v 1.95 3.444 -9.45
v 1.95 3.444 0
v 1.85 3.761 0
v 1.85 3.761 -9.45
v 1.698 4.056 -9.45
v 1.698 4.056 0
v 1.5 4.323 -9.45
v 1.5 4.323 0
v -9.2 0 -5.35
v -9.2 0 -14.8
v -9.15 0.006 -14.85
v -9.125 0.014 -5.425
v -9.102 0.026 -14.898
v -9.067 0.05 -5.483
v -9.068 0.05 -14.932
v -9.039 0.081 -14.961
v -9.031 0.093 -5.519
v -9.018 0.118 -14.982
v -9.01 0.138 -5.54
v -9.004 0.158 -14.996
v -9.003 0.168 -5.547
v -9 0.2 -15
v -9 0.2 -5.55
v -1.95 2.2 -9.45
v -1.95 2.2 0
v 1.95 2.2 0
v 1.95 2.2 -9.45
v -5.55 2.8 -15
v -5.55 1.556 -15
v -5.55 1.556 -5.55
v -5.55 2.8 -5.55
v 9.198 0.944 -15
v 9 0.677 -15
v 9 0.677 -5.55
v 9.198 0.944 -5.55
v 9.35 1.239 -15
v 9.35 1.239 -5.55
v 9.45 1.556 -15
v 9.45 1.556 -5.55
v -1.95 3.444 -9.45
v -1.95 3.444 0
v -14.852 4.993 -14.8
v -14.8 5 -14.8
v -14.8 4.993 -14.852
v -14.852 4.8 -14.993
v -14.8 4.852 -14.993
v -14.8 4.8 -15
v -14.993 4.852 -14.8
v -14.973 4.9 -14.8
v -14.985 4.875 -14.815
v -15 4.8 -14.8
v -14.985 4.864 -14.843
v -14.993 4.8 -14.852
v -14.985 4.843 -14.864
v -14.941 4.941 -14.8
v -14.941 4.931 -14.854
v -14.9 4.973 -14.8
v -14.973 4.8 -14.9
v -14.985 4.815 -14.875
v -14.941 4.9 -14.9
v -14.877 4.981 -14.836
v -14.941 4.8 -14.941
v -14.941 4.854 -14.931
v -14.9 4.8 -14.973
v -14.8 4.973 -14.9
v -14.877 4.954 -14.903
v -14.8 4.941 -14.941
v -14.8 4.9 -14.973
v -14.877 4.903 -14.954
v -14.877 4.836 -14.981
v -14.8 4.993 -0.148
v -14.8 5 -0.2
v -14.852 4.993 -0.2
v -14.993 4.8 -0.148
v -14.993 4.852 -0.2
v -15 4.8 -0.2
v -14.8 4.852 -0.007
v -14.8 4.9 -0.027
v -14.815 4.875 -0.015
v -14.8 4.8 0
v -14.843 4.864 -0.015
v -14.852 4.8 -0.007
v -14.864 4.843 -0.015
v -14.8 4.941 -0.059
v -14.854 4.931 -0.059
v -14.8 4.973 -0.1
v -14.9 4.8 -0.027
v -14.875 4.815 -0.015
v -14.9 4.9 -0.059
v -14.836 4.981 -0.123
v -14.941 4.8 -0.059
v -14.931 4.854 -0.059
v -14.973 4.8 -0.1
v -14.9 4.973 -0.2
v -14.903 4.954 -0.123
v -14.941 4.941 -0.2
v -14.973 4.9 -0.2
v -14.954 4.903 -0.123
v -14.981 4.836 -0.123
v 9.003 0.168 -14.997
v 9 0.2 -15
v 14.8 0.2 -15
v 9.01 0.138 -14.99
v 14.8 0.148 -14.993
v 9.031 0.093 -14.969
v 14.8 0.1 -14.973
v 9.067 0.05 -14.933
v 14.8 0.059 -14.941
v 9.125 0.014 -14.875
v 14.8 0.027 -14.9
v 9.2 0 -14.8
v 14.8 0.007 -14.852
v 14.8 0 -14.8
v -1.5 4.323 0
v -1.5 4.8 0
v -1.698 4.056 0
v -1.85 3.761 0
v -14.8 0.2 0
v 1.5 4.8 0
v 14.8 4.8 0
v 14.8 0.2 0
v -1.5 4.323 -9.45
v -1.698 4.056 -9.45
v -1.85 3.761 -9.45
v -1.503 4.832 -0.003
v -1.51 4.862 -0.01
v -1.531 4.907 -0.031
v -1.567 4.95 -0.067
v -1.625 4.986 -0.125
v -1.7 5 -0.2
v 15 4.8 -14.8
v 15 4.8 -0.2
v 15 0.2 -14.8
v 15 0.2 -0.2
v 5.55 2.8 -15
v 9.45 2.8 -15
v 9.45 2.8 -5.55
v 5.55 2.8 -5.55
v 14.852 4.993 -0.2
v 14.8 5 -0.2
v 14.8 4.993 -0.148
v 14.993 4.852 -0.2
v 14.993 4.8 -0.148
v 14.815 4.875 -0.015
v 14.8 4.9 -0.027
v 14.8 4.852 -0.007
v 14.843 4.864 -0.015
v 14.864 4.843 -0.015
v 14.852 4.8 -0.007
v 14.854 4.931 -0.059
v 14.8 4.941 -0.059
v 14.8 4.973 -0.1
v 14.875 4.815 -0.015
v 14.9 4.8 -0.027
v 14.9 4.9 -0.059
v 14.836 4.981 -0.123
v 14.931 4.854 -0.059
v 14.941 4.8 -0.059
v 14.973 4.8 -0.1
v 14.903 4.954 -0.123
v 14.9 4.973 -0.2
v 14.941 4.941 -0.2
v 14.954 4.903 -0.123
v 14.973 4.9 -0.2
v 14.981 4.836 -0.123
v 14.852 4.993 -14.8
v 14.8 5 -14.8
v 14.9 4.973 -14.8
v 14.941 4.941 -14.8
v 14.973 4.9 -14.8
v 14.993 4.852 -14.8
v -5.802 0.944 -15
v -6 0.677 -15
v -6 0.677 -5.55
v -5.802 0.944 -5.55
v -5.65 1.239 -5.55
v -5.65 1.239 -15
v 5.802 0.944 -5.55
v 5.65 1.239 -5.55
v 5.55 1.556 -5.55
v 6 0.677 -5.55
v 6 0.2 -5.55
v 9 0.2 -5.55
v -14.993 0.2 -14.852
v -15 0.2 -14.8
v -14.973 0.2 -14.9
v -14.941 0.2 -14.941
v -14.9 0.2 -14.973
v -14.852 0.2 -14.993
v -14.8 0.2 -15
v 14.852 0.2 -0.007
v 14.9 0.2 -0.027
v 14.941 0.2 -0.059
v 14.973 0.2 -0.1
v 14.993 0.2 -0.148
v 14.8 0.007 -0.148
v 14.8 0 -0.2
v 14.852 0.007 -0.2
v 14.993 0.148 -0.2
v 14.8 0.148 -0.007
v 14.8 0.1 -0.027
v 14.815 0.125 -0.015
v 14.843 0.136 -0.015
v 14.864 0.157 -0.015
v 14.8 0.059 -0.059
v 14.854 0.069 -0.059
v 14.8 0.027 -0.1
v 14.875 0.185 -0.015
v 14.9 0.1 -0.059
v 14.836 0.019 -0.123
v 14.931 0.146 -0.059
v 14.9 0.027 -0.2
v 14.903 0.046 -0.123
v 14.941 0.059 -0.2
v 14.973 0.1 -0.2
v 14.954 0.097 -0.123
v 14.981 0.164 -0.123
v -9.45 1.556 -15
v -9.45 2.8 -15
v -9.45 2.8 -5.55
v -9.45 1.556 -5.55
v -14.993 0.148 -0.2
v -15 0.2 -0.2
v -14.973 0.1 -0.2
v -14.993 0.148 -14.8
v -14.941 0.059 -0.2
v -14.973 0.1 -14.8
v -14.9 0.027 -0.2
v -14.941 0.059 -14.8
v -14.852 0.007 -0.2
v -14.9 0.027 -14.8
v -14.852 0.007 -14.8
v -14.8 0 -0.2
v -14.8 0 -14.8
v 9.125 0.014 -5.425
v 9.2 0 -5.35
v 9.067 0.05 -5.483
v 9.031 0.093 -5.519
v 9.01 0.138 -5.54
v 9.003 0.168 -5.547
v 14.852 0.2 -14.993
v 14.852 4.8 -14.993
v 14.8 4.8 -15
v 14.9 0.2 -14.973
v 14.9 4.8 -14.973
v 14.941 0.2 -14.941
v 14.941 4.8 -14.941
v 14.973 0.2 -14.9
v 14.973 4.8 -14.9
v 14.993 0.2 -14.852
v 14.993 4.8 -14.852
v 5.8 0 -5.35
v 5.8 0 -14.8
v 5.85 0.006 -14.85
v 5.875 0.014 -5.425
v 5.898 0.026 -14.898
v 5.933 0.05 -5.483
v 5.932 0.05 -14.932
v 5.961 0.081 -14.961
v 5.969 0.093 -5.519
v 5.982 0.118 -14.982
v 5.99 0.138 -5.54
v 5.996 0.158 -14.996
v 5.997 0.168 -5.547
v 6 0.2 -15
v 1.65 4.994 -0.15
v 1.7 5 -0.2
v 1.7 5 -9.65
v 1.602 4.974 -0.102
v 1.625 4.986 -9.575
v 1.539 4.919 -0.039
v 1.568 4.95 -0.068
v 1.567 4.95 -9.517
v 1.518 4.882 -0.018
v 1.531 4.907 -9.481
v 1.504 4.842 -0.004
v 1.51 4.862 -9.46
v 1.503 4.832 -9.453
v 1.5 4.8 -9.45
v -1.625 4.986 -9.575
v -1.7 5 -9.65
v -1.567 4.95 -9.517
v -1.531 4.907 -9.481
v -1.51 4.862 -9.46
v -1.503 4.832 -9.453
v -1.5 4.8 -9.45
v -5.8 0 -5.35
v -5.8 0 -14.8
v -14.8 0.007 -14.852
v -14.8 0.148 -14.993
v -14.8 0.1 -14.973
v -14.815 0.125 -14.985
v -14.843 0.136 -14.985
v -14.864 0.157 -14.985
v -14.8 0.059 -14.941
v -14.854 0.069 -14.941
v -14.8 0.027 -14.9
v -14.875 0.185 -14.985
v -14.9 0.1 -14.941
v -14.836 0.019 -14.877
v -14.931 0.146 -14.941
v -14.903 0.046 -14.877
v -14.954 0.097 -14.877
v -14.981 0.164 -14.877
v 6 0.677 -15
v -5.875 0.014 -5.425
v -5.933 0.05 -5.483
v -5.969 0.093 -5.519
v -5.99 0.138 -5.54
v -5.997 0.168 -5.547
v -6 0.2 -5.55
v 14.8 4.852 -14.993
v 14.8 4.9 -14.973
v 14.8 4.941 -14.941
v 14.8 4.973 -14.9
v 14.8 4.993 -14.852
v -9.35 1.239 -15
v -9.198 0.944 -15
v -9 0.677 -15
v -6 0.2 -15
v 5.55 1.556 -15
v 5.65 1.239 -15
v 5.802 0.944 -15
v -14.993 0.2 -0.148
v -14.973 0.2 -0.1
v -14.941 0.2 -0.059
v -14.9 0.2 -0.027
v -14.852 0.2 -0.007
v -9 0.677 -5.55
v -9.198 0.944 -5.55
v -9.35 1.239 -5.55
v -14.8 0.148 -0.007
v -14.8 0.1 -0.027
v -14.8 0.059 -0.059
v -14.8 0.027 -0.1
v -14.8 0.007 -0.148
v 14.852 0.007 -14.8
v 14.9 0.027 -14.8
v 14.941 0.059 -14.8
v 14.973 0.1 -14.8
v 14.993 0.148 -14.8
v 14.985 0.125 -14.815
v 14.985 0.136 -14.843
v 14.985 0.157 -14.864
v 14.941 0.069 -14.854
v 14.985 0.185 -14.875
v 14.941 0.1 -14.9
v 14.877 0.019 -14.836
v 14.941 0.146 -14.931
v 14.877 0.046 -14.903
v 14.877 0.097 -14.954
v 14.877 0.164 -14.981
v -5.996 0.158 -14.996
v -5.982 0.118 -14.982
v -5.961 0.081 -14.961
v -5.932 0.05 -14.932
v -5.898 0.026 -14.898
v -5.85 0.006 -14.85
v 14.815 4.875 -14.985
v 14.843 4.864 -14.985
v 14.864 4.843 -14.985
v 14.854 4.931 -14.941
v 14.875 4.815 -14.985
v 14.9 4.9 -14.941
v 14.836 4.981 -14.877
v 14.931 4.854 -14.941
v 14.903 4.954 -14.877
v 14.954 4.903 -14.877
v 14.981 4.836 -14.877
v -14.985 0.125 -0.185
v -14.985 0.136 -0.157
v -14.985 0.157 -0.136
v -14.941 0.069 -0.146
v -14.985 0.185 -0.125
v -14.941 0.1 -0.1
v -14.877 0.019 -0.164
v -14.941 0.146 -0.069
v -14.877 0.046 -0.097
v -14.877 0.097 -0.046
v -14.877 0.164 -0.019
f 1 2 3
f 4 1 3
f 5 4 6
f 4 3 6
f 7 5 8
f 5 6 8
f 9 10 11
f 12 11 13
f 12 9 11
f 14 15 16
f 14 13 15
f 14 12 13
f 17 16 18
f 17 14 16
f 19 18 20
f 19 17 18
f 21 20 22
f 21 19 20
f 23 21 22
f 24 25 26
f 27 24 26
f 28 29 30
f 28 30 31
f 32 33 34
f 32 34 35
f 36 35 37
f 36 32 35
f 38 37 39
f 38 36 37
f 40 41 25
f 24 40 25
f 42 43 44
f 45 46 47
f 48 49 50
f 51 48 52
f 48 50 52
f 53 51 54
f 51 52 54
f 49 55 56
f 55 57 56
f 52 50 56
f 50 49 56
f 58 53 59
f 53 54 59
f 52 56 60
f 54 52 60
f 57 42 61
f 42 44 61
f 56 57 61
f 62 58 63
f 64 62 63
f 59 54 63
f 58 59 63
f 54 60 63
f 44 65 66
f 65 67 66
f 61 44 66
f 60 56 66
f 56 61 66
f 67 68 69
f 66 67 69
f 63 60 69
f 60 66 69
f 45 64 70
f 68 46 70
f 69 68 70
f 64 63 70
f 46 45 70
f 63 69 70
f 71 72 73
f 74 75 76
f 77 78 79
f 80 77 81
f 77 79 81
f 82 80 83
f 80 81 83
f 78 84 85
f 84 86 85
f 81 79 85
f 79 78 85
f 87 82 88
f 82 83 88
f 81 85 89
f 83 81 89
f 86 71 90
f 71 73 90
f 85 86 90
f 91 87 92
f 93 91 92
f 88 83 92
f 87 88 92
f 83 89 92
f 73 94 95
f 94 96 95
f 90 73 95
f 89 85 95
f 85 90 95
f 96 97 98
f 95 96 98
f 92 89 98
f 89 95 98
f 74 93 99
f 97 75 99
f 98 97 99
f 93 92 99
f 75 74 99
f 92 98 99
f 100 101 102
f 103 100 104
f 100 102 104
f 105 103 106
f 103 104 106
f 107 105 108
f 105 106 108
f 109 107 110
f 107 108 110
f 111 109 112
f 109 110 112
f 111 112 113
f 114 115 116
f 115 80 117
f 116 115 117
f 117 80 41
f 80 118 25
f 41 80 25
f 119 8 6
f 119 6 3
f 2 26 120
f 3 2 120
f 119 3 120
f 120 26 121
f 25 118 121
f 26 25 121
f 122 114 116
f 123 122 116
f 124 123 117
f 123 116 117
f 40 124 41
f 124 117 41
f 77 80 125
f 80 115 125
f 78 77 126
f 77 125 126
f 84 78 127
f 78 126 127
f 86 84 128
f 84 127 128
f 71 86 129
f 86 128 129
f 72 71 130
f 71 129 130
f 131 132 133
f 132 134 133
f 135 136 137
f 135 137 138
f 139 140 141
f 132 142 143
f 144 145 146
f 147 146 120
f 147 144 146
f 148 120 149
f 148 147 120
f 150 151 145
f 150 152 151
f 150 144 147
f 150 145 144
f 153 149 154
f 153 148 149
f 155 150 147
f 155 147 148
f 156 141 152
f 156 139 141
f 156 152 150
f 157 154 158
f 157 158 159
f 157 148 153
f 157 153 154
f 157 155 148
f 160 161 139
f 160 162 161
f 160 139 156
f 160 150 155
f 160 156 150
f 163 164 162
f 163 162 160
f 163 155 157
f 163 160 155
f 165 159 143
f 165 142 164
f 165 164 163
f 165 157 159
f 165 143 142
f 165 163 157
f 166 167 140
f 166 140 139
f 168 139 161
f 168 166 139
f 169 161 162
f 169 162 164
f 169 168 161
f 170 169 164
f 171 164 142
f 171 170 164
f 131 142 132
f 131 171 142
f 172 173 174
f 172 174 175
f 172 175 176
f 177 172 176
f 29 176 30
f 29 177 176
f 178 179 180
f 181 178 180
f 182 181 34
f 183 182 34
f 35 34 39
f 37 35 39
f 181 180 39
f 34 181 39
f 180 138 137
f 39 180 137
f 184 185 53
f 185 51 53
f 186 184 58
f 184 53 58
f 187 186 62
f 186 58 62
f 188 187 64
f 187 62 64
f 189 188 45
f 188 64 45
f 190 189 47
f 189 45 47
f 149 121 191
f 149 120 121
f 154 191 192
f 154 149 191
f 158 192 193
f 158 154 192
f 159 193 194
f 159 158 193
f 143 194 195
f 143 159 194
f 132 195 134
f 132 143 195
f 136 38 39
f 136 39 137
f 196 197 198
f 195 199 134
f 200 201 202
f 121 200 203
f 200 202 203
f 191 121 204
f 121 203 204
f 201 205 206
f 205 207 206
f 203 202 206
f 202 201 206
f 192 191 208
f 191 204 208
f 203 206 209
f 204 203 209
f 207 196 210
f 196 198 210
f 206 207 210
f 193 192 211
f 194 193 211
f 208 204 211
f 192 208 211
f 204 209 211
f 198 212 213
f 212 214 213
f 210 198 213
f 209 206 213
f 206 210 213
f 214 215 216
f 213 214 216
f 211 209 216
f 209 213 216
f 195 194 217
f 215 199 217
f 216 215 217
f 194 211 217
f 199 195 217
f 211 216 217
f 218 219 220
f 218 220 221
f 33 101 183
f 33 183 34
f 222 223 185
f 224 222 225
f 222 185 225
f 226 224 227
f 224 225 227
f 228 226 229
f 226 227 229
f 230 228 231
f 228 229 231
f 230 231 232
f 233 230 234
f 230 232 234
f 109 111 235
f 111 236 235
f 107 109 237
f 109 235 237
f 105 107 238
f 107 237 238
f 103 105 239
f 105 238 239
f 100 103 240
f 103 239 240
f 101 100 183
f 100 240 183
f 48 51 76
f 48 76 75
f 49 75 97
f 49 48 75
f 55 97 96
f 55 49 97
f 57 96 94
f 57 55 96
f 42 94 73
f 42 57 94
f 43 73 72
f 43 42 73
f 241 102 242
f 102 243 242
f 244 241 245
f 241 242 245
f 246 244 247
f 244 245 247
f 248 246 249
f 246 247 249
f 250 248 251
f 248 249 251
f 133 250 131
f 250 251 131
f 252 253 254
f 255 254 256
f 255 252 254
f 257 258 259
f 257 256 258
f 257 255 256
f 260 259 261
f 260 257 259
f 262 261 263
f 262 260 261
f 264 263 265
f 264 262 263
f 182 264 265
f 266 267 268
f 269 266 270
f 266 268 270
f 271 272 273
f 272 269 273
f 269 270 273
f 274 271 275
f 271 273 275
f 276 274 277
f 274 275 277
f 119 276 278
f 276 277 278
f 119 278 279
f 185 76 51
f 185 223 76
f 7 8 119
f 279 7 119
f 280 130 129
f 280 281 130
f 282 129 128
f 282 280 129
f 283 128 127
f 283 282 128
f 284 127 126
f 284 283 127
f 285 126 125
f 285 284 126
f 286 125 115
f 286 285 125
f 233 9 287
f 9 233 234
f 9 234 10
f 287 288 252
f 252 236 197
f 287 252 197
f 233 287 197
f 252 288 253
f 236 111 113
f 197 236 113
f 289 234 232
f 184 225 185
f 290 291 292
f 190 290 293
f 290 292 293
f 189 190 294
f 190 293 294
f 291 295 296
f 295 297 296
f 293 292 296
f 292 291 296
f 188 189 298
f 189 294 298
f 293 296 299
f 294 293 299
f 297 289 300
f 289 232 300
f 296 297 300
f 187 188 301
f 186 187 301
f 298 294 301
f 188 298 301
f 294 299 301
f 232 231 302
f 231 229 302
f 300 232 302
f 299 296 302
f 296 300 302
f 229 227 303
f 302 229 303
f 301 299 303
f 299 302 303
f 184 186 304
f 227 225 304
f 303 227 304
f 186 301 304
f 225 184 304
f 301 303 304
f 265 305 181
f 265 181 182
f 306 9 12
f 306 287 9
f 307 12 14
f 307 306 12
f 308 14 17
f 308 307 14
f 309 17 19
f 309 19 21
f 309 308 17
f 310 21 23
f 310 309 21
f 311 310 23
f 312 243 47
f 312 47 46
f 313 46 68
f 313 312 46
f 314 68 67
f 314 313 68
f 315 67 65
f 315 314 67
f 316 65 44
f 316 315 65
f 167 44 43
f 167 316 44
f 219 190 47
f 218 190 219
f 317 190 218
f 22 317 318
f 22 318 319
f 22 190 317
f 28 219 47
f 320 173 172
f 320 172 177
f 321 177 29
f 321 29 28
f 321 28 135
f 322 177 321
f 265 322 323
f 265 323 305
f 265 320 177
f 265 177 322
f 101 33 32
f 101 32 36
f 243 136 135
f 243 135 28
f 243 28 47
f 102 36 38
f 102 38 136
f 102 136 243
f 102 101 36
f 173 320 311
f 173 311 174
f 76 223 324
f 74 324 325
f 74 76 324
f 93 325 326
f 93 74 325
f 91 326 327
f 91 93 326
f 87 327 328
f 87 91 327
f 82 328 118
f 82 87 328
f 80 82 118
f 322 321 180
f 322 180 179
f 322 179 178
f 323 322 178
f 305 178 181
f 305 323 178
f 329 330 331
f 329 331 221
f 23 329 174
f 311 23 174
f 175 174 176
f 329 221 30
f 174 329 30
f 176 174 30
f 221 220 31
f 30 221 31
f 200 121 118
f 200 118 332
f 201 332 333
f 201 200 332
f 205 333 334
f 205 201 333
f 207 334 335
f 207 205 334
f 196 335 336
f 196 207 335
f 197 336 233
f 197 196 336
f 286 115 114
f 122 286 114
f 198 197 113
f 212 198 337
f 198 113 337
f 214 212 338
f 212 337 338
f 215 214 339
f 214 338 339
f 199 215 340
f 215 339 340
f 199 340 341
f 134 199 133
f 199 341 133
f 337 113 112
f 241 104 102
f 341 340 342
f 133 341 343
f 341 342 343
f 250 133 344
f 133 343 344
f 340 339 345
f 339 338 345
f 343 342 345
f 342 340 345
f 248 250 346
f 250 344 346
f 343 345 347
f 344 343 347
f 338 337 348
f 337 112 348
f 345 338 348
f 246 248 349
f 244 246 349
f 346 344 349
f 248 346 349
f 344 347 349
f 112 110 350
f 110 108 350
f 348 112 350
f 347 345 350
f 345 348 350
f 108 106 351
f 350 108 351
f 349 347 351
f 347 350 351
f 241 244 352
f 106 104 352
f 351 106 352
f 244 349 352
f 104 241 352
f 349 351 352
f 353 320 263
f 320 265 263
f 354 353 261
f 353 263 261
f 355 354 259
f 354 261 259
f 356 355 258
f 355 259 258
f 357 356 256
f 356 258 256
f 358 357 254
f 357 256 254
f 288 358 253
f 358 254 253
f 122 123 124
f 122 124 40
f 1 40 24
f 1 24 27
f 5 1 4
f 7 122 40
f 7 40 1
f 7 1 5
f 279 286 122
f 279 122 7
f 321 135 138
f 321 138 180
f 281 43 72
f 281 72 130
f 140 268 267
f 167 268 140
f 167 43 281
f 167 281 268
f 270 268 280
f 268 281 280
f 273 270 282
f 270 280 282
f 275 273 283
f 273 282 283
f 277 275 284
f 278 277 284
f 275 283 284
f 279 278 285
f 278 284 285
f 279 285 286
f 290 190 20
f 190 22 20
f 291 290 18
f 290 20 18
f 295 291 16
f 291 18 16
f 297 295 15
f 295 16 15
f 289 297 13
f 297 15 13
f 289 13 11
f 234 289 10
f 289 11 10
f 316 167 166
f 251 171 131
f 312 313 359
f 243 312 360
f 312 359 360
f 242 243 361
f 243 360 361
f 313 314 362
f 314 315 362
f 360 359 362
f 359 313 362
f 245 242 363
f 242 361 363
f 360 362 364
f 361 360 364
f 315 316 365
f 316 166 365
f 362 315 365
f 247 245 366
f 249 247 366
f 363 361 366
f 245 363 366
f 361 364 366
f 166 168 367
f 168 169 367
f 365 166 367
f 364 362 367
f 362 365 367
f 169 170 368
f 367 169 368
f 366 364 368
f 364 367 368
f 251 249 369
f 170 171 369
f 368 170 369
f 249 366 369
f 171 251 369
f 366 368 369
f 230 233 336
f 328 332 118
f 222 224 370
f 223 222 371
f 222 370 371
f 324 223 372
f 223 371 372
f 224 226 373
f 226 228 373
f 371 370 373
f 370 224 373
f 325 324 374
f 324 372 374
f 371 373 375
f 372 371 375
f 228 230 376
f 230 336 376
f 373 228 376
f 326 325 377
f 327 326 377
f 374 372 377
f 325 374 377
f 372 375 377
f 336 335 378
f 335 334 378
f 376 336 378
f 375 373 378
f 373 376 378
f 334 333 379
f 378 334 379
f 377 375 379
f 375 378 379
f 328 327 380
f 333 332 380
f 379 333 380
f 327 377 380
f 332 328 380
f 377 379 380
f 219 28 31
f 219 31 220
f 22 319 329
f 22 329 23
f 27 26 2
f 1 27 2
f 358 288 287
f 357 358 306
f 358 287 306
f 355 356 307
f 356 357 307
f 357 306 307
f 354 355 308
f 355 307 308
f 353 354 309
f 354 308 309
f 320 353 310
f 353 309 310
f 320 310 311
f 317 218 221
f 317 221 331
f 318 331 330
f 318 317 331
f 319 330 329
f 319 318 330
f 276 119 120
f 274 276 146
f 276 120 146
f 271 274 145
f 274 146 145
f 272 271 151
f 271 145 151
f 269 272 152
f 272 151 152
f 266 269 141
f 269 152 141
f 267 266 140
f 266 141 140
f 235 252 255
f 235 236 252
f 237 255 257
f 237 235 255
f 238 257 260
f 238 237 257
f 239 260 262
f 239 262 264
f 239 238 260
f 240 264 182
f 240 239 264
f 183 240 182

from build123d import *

# Parameters (mm, degrees)
SKETCH_1_W          = 30
SKETCH_1_H          = 15
EXTRUDE_1_DEPTH     = 5
CUT_EXTRUDE_1_DEPTH = 9.45
CUT_EXTRUDE_2_DEPTH = 9.45
FILLET_1_R          = 0.2


with BuildPart() as part:
    # 草图1 → 凸台-拉伸1 (new body)
    with BuildSketch(Plane(origin=(0, 0, 0), x_dir=(1, 0, 0), z_dir=(0, 1, 0))):
        with Locations((0, 7.5)):
            Rectangle(SKETCH_1_W, SKETCH_1_H)
    extrude(amount=EXTRUDE_1_DEPTH)

    # 草图2 → 切除-拉伸1 (cut)
    with BuildSketch(Plane.XY):
        with BuildLine():
            Line((-1.5, 5), (-1.5, 4.322875656))
            ThreePointArc((-1.5, 4.322875656), (-1.780042303, 3.911838473), (-1.95, 3.444409721))
            Line((-1.95, 3.444409721), (-1.95, 2.2))
            Line((-1.95, 2.2), (1.95, 2.2))
            Line((1.95, 2.2), (1.95, 3.444409721))
            ThreePointArc((1.95, 3.444409721), (1.780042303, 3.911838473), (1.5, 4.322875656))
            Line((1.5, 4.322875656), (1.5, 5))
            Line((1.5, 5), (-1.5, 5))
        make_face()
    extrude(amount=-CUT_EXTRUDE_1_DEPTH, mode=Mode.SUBTRACT)

    # 草图3 → 切除-拉伸2 (cut)
    with BuildSketch(Plane(origin=(0, 0, -15), x_dir=(-1, 0, 0), z_dir=(0, 0, -1))):
        with BuildLine():
            Line((-9, 0), (-9, 0.677124344))
            ThreePointArc((-9, 0.677124344), (-9.280042303, 1.088161527), (-9.45, 1.555590279))
            Line((-9.45, 1.555590279), (-9.45, 2.8))
            Line((-9.45, 2.8), (-5.55, 2.8))
            Line((-5.55, 2.8), (-5.55, 1.555590279))
            ThreePointArc((-5.55, 1.555590279), (-5.719957697, 1.088161527), (-6, 0.677124344))
            Line((-6, 0.677124344), (-6, 0))
            Line((-6, 0), (-9, 0))
        make_face()
        with BuildLine():
            Line((9, 0), (6, 0))
            Line((6, 0), (6, 0.677124344))
            ThreePointArc((6, 0.677124344), (5.719957697, 1.088161527), (5.55, 1.555590279))
            Line((5.55, 1.555590279), (5.55, 2.8))
            Line((5.55, 2.8), (9.45, 2.8))
            Line((9.45, 2.8), (9.45, 1.555590279))
            ThreePointArc((9.45, 1.555590279), (9.280042303, 1.088161527), (9, 0.677124344))
            Line((9, 0.677124344), (9, 0))
        make_face()
    extrude(amount=-CUT_EXTRUDE_2_DEPTH, mode=Mode.SUBTRACT)

    # 圆角1
    fillet_1_edges = [part.edges().sort_by_distance(p)[0] for p in [
        (15, 5, -7.5),
        (0, 5, -15),
        (8.25, 5, 0),
        (0, 5, -9.45),
        (-1.5, 5, -4.725),
        (1.5, 5, -4.725),
        (0, 0, -15),
        (-15, 5, -7.5),
        (7.5, 0, -5.55),
        (6, 0, -10.275),
        (9, 0, -10.275),
        (12, 0, -15),
        (15, 0, -7.5),
        (0, 0, 0),
        (-15, 0, -7.5),
        (-12, 0, -15),
        (-7.5, 0, -5.55),
        (-9, 0, -10.275),
        (-6, 0, -10.275),
        (-8.25, 5, 0),
        (-15, 2.5, -15),
        (15, 2.5, -15),
        (15, 2.5, 0),
        (-15, 2.5, 0),
    ]]
    fillet(fillet_1_edges, radius=FILLET_1_R)


solid = part.part
